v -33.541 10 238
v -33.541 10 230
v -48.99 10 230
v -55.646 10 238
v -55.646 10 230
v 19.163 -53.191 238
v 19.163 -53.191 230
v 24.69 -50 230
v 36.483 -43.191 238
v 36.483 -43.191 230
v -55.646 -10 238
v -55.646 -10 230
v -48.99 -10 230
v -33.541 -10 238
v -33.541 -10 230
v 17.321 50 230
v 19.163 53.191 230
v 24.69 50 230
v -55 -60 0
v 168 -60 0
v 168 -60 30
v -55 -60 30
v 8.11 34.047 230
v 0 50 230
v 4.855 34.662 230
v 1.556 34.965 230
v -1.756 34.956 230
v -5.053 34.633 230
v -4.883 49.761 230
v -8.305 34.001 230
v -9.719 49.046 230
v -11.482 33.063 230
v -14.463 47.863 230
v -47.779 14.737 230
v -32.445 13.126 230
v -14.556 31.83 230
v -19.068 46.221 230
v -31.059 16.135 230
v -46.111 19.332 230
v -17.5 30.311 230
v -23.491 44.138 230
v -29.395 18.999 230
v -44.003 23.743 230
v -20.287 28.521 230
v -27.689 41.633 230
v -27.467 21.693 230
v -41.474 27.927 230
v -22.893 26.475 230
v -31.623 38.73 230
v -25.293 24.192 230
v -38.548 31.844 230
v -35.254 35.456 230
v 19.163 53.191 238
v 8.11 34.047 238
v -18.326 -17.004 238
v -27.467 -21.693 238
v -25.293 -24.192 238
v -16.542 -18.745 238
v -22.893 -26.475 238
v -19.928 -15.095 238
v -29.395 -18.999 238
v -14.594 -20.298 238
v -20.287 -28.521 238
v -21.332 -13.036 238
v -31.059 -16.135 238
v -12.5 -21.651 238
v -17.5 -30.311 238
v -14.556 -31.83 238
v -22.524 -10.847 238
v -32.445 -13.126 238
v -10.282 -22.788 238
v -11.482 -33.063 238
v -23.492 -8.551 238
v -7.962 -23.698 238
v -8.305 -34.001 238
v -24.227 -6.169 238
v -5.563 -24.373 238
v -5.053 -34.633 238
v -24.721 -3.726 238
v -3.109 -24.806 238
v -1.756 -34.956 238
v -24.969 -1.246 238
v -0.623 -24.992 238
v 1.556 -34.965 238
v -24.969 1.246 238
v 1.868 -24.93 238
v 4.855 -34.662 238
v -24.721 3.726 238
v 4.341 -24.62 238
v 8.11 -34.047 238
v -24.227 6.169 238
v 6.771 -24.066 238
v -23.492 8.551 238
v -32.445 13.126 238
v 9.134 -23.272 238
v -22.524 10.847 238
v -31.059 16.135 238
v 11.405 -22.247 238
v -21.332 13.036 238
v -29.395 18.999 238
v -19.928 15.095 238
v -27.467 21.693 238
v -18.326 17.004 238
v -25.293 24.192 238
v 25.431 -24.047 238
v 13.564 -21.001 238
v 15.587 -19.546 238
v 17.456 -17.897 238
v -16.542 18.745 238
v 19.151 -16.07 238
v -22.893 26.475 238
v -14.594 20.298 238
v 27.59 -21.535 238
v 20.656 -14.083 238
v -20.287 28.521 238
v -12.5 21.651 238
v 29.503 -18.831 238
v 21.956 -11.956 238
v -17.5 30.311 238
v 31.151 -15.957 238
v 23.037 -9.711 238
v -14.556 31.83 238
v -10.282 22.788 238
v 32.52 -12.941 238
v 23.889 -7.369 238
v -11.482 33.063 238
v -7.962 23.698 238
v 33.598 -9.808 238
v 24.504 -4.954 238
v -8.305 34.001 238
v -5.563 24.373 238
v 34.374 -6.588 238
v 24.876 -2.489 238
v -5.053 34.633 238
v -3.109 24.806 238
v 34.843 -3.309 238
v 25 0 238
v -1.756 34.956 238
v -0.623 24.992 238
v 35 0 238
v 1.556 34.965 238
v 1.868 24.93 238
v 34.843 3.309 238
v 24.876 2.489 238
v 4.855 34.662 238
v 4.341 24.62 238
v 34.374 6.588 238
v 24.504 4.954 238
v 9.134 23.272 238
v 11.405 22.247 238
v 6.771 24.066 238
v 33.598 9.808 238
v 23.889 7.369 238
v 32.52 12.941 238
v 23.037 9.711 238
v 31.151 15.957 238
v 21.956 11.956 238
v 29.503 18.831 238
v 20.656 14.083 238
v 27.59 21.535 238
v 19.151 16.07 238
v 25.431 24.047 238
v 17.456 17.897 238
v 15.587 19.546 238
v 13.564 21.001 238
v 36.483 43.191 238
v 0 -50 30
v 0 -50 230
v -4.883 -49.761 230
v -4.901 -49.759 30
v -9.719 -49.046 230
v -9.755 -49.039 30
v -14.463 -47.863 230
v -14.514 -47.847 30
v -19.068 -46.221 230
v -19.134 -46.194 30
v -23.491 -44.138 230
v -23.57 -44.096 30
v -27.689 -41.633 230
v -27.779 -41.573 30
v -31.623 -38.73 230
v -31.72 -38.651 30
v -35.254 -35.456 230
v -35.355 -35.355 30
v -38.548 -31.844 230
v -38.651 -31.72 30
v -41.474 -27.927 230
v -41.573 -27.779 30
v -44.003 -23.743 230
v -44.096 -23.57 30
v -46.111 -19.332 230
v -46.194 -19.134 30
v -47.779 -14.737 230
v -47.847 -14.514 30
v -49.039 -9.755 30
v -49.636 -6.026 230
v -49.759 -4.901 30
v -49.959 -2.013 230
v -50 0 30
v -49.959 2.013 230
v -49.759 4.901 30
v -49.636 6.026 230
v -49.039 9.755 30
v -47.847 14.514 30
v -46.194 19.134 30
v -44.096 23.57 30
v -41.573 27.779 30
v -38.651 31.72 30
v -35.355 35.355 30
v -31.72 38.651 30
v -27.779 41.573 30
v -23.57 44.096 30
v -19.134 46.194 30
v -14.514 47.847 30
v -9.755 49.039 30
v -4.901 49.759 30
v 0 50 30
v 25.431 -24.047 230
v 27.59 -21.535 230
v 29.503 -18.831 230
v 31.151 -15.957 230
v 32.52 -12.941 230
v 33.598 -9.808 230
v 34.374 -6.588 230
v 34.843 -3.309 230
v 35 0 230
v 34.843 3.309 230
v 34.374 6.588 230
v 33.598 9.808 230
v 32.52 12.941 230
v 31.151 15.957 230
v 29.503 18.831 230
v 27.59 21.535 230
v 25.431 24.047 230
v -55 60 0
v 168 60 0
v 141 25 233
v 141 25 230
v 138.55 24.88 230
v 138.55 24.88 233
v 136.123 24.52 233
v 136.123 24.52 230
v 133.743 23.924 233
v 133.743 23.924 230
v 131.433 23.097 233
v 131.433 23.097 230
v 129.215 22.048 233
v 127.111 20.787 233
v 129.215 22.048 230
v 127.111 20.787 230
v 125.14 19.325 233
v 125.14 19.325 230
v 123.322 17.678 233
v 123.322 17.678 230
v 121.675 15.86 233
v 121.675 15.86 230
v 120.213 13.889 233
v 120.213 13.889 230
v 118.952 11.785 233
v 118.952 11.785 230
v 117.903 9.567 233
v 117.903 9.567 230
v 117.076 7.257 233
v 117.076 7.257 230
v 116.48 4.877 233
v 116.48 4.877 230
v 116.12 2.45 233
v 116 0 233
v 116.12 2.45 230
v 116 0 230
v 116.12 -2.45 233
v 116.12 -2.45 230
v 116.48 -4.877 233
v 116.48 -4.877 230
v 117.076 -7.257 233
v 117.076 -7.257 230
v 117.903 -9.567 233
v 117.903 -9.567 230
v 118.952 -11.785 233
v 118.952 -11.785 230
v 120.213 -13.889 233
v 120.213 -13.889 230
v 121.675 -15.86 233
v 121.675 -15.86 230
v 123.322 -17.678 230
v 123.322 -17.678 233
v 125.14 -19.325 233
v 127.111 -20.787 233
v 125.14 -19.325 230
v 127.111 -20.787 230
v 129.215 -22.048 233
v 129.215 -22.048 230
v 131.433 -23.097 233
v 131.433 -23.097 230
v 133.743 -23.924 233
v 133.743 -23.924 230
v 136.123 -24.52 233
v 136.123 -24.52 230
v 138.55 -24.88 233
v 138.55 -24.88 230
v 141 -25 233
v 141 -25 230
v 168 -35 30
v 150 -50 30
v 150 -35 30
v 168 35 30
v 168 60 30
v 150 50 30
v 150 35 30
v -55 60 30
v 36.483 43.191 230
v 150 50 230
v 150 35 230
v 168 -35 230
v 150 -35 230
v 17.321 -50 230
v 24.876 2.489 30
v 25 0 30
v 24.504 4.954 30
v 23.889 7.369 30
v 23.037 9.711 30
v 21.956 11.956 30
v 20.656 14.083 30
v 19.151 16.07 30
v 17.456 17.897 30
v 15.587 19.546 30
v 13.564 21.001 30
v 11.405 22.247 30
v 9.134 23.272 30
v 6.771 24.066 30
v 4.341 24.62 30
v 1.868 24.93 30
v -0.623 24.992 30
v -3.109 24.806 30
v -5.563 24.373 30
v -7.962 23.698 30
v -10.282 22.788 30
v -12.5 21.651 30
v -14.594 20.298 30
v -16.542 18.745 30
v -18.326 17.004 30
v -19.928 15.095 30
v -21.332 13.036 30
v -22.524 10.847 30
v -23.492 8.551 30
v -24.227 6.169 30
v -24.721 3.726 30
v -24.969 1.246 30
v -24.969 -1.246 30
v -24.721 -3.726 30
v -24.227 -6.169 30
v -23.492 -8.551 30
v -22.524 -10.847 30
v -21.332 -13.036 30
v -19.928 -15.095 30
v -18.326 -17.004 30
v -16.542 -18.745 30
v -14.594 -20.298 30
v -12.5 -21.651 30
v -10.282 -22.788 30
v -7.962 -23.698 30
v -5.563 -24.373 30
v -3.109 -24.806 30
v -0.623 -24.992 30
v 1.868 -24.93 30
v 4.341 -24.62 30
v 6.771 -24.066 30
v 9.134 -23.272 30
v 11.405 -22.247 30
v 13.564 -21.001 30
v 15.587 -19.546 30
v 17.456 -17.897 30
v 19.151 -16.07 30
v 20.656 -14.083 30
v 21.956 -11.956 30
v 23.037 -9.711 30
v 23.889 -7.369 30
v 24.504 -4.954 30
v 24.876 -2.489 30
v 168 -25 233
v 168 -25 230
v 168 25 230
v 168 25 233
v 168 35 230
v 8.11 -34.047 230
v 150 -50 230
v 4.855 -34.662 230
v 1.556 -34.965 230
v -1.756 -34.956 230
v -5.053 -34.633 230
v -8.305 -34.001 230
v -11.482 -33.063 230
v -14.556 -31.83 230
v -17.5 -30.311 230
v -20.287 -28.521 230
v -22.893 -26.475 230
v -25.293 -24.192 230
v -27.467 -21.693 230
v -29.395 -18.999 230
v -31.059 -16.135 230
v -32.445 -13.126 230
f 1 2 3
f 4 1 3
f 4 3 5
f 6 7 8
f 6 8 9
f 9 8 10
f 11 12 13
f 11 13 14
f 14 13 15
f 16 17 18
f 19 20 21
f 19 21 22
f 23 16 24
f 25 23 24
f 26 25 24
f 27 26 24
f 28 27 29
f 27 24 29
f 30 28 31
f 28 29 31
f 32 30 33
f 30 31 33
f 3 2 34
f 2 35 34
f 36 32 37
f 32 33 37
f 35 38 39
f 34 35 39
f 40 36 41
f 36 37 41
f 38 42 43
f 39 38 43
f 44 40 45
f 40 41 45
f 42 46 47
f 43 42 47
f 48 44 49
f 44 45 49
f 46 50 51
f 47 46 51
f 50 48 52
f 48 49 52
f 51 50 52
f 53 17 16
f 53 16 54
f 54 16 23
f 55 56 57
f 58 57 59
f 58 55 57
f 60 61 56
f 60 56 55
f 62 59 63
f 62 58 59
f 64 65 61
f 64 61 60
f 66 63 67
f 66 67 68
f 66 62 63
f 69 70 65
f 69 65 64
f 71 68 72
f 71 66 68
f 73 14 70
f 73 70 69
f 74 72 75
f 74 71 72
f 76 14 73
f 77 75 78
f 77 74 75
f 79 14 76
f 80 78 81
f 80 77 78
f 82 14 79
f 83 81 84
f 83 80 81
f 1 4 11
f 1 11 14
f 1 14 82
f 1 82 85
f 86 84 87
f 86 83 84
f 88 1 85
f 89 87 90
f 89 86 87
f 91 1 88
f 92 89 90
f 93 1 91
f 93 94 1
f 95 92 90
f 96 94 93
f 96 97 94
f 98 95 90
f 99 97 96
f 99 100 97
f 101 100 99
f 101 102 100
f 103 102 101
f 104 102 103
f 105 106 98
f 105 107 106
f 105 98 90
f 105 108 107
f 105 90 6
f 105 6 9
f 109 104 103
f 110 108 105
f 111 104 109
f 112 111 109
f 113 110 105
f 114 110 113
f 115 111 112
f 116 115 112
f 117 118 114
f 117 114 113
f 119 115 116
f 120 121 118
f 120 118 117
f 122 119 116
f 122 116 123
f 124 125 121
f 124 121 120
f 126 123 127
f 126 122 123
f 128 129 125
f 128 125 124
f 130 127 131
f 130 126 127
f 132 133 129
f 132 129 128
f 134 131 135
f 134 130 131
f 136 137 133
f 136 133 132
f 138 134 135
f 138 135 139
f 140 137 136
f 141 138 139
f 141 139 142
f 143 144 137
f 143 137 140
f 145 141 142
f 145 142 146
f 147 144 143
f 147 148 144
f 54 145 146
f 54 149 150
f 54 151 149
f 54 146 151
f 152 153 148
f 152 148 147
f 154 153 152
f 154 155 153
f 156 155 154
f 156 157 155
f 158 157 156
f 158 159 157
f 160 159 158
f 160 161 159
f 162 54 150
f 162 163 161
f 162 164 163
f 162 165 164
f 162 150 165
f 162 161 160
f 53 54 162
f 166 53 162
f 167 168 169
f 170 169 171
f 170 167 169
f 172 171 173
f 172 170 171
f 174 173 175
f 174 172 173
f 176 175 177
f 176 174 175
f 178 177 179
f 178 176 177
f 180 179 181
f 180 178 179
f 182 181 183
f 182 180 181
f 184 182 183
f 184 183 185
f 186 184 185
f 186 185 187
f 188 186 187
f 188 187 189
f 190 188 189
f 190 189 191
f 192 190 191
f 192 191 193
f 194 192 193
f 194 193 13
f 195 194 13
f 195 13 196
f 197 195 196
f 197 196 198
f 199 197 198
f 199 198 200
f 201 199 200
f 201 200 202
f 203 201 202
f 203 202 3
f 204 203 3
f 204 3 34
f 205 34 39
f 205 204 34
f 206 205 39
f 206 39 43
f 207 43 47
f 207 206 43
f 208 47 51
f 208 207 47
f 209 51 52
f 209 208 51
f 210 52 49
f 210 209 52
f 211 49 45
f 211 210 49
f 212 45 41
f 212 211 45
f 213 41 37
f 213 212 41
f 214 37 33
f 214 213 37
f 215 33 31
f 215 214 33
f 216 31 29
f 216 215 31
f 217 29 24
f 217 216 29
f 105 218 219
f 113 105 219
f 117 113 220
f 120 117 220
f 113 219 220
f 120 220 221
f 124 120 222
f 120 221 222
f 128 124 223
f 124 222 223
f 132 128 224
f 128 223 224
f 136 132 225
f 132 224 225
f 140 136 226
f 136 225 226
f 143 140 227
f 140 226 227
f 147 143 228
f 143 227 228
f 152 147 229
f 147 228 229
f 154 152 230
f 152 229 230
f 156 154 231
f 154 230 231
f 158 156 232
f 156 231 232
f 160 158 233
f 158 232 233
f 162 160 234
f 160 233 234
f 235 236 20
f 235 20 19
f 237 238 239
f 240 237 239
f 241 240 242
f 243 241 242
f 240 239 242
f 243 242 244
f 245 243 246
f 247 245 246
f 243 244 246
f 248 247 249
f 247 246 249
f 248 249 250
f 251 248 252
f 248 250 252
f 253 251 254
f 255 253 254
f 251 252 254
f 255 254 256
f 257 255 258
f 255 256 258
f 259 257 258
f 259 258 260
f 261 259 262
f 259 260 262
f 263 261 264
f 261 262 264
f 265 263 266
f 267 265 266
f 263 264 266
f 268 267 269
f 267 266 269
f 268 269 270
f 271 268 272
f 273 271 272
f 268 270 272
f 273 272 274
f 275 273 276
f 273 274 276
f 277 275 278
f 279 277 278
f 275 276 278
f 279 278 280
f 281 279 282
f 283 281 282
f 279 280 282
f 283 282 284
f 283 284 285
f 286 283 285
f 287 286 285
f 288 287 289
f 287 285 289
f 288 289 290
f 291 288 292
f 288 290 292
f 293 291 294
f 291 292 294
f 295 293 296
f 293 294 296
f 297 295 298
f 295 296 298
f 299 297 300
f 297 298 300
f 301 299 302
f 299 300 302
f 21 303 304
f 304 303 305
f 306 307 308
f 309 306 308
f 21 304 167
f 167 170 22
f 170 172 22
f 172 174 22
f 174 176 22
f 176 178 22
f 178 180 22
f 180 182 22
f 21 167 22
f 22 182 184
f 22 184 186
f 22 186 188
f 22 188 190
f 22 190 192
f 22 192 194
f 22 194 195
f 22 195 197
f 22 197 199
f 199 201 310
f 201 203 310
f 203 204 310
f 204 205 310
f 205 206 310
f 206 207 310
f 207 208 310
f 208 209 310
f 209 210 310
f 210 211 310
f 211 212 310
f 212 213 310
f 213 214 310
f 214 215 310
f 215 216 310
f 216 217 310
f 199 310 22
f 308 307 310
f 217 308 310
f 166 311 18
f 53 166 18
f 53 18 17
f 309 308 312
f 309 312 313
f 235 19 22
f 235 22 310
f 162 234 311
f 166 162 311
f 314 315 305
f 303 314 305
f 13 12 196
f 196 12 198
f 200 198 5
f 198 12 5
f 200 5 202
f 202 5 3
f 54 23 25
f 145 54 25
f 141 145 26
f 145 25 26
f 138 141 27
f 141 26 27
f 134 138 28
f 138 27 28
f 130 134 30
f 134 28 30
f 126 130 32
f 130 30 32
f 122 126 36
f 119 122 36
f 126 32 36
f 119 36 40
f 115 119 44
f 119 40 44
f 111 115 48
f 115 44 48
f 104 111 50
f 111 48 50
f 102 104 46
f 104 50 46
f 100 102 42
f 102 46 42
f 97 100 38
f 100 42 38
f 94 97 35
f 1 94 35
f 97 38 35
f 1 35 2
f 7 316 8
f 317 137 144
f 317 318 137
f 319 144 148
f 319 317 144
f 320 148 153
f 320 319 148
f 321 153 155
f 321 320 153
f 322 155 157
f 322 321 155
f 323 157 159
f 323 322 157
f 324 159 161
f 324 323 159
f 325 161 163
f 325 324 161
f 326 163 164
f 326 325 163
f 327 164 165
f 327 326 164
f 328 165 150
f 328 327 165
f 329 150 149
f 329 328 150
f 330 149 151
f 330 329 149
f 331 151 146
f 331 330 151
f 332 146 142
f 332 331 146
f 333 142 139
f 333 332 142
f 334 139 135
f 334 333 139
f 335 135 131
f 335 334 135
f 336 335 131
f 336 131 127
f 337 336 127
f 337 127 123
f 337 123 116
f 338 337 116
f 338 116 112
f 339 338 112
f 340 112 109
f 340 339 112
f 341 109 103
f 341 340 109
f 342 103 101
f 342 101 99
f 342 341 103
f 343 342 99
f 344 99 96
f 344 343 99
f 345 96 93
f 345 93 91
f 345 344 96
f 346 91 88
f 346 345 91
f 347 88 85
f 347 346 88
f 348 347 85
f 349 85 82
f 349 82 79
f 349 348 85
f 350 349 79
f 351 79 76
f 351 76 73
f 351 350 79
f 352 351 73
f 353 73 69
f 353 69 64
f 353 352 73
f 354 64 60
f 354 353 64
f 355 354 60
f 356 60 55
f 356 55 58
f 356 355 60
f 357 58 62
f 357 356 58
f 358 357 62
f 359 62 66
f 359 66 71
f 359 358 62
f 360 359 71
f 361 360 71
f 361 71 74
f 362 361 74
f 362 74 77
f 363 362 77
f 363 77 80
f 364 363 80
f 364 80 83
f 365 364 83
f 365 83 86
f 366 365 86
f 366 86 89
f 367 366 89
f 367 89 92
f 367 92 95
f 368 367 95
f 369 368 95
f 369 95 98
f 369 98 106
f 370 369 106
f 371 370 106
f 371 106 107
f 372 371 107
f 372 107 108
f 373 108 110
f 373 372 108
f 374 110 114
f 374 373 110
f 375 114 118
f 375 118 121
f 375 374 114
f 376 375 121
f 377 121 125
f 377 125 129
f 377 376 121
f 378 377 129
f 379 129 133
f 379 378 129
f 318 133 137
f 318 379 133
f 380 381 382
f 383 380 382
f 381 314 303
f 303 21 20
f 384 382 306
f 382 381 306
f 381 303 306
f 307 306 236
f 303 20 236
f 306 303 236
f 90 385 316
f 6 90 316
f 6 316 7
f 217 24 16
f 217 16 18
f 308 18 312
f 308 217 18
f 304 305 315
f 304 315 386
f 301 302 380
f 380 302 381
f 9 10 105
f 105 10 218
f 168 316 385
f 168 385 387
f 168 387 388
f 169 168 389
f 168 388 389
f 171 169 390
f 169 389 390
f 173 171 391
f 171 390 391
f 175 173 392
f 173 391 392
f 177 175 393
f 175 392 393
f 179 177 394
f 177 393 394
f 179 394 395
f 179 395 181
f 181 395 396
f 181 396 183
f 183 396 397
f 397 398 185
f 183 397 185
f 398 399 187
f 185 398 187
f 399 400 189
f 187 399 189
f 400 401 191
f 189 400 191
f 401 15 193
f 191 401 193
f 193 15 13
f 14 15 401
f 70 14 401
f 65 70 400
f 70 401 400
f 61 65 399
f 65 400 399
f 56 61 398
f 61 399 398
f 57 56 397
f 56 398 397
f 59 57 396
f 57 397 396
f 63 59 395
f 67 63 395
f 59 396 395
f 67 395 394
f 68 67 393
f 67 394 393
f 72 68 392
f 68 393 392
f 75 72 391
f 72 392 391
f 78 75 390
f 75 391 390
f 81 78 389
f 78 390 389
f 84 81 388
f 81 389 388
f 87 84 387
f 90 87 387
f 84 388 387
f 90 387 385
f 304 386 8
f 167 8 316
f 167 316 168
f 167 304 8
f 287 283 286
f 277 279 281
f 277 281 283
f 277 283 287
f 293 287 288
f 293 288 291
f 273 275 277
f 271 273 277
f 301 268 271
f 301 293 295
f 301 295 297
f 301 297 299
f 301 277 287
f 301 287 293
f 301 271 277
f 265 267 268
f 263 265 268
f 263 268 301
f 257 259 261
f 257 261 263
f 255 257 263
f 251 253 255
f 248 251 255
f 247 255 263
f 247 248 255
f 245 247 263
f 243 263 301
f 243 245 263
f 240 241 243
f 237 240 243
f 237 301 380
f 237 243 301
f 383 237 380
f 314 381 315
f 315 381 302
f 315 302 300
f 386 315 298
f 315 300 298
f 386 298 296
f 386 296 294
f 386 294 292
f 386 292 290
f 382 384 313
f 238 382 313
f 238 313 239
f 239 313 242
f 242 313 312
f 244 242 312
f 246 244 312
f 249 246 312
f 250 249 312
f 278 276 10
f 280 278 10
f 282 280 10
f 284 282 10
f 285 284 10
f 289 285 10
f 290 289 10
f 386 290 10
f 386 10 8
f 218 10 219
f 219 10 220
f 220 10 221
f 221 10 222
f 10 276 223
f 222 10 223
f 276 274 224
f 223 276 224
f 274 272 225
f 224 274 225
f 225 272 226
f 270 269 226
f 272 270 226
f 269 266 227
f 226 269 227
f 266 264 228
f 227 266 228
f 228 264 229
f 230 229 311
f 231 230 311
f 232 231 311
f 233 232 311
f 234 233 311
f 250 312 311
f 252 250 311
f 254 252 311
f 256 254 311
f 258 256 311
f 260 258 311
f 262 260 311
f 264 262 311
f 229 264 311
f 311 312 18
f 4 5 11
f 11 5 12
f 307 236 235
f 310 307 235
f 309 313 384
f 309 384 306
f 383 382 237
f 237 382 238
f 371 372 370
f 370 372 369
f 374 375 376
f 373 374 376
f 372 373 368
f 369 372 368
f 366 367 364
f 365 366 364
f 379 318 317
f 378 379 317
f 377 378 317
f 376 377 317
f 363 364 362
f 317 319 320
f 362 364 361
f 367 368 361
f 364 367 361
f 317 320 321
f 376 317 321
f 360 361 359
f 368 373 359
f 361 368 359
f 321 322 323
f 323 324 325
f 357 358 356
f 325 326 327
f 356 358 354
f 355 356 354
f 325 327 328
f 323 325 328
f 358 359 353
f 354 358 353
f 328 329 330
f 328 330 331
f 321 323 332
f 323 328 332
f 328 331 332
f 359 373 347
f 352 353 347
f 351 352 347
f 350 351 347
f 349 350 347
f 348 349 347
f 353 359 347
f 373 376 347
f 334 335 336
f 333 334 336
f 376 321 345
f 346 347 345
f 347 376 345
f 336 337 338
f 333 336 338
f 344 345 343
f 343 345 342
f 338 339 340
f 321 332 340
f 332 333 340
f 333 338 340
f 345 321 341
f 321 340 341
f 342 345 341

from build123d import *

# Parameters (mm, degrees)
SKETCH_1_R      = 25
EXTRUDE_1_DEPTH = 230
SKETCH_2_W      = 230
SKETCH_2_H      = 70
EXTRUDE_2_DEPTH = 18
SKETCH_3_W      = 223
SKETCH_3_H      = 120
EXTRUDE_3_DEPTH = 30
EXTRUDE_4_DEPTH = 3
SKETCH_5_R      = 25
EXTRUDE_5_DEPTH = 8


with BuildPart() as part:
    # 草图1 → 凸台-拉伸1 (new body)
    with BuildSketch(Plane.XY):
        with BuildLine():
            Line((0, 50), (150, 50))
            Line((150, 50), (150, -50))
            Line((150, -50), (0, -50))
            ThreePointArc((0, -50), (-50, 0), (0, 50))
        make_face()
        Circle(SKETCH_1_R, mode=Mode.SUBTRACT)
    extrude(amount=EXTRUDE_1_DEPTH)

    # 草图2 → 凸台-拉伸2 (add)
    with BuildSketch(Plane(origin=(150, 0, 0), x_dir=(0, 0, -1), z_dir=(1, 0, 0))):
        with Locations((-115, 0)):
            Rectangle(SKETCH_2_W, SKETCH_2_H)
    extrude(amount=EXTRUDE_2_DEPTH)

    # 草图3 → 凸台-拉伸3 (add)
    with BuildSketch(Plane(origin=(0, 0, 0), x_dir=(-1, 0, 0), z_dir=(0, 0, -1))):
        with Locations((-56.5, 0)):
            Rectangle(SKETCH_3_W, SKETCH_3_H)
    extrude(amount=-EXTRUDE_3_DEPTH)

    # 草图4 → 凸台-拉伸4 (add)
    with BuildSketch(Plane.XY.offset(230)):
        with BuildLine():
            Line((168, 25), (141, 25))
            ThreePointArc((141, 25), (116, 0), (141, -25))
            Line((141, -25), (168, -25))
            Line((168, -25), (168, 25))
        make_face()
    extrude(amount=EXTRUDE_4_DEPTH)

    # 草图5 → 凸台-拉伸5 (add)
    with BuildSketch(Plane.XY.offset(230)):
        with BuildLine():
            Line((-55.646359671, 10), (-55.646359671, -10))
            Line((-55.646359671, -10), (-33.541019662, -10))
            ThreePointArc((-33.541019662, -10), (-17.5, -30.310889132), (8.110255793, -34.047375097))
            Line((8.110255793, -34.047375097), (19.162925798, -53.191161103))
            Line((19.162925798, -53.191161103), (36.483433873, -43.191161103))
            Line((36.483433873, -43.191161103), (25.430763869, -24.047375097))
            ThreePointArc((25.430763869, -24.047375097), (35, 0), (25.430763869, 24.047375097))
            Line((25.430763869, 24.047375097), (36.483433873, 43.191161103))
            Line((36.483433873, 43.191161103), (19.162925798, 53.191161103))
            Line((19.162925798, 53.191161103), (8.110255793, 34.047375097))
            ThreePointArc((8.110255793, 34.047375097), (-17.5, 30.310889132), (-33.541019662, 10))
            Line((-33.541019662, 10), (-55.646359671, 10))
        make_face()
        Circle(SKETCH_5_R, mode=Mode.SUBTRACT)
    extrude(amount=EXTRUDE_5_DEPTH)


solid = part.part
